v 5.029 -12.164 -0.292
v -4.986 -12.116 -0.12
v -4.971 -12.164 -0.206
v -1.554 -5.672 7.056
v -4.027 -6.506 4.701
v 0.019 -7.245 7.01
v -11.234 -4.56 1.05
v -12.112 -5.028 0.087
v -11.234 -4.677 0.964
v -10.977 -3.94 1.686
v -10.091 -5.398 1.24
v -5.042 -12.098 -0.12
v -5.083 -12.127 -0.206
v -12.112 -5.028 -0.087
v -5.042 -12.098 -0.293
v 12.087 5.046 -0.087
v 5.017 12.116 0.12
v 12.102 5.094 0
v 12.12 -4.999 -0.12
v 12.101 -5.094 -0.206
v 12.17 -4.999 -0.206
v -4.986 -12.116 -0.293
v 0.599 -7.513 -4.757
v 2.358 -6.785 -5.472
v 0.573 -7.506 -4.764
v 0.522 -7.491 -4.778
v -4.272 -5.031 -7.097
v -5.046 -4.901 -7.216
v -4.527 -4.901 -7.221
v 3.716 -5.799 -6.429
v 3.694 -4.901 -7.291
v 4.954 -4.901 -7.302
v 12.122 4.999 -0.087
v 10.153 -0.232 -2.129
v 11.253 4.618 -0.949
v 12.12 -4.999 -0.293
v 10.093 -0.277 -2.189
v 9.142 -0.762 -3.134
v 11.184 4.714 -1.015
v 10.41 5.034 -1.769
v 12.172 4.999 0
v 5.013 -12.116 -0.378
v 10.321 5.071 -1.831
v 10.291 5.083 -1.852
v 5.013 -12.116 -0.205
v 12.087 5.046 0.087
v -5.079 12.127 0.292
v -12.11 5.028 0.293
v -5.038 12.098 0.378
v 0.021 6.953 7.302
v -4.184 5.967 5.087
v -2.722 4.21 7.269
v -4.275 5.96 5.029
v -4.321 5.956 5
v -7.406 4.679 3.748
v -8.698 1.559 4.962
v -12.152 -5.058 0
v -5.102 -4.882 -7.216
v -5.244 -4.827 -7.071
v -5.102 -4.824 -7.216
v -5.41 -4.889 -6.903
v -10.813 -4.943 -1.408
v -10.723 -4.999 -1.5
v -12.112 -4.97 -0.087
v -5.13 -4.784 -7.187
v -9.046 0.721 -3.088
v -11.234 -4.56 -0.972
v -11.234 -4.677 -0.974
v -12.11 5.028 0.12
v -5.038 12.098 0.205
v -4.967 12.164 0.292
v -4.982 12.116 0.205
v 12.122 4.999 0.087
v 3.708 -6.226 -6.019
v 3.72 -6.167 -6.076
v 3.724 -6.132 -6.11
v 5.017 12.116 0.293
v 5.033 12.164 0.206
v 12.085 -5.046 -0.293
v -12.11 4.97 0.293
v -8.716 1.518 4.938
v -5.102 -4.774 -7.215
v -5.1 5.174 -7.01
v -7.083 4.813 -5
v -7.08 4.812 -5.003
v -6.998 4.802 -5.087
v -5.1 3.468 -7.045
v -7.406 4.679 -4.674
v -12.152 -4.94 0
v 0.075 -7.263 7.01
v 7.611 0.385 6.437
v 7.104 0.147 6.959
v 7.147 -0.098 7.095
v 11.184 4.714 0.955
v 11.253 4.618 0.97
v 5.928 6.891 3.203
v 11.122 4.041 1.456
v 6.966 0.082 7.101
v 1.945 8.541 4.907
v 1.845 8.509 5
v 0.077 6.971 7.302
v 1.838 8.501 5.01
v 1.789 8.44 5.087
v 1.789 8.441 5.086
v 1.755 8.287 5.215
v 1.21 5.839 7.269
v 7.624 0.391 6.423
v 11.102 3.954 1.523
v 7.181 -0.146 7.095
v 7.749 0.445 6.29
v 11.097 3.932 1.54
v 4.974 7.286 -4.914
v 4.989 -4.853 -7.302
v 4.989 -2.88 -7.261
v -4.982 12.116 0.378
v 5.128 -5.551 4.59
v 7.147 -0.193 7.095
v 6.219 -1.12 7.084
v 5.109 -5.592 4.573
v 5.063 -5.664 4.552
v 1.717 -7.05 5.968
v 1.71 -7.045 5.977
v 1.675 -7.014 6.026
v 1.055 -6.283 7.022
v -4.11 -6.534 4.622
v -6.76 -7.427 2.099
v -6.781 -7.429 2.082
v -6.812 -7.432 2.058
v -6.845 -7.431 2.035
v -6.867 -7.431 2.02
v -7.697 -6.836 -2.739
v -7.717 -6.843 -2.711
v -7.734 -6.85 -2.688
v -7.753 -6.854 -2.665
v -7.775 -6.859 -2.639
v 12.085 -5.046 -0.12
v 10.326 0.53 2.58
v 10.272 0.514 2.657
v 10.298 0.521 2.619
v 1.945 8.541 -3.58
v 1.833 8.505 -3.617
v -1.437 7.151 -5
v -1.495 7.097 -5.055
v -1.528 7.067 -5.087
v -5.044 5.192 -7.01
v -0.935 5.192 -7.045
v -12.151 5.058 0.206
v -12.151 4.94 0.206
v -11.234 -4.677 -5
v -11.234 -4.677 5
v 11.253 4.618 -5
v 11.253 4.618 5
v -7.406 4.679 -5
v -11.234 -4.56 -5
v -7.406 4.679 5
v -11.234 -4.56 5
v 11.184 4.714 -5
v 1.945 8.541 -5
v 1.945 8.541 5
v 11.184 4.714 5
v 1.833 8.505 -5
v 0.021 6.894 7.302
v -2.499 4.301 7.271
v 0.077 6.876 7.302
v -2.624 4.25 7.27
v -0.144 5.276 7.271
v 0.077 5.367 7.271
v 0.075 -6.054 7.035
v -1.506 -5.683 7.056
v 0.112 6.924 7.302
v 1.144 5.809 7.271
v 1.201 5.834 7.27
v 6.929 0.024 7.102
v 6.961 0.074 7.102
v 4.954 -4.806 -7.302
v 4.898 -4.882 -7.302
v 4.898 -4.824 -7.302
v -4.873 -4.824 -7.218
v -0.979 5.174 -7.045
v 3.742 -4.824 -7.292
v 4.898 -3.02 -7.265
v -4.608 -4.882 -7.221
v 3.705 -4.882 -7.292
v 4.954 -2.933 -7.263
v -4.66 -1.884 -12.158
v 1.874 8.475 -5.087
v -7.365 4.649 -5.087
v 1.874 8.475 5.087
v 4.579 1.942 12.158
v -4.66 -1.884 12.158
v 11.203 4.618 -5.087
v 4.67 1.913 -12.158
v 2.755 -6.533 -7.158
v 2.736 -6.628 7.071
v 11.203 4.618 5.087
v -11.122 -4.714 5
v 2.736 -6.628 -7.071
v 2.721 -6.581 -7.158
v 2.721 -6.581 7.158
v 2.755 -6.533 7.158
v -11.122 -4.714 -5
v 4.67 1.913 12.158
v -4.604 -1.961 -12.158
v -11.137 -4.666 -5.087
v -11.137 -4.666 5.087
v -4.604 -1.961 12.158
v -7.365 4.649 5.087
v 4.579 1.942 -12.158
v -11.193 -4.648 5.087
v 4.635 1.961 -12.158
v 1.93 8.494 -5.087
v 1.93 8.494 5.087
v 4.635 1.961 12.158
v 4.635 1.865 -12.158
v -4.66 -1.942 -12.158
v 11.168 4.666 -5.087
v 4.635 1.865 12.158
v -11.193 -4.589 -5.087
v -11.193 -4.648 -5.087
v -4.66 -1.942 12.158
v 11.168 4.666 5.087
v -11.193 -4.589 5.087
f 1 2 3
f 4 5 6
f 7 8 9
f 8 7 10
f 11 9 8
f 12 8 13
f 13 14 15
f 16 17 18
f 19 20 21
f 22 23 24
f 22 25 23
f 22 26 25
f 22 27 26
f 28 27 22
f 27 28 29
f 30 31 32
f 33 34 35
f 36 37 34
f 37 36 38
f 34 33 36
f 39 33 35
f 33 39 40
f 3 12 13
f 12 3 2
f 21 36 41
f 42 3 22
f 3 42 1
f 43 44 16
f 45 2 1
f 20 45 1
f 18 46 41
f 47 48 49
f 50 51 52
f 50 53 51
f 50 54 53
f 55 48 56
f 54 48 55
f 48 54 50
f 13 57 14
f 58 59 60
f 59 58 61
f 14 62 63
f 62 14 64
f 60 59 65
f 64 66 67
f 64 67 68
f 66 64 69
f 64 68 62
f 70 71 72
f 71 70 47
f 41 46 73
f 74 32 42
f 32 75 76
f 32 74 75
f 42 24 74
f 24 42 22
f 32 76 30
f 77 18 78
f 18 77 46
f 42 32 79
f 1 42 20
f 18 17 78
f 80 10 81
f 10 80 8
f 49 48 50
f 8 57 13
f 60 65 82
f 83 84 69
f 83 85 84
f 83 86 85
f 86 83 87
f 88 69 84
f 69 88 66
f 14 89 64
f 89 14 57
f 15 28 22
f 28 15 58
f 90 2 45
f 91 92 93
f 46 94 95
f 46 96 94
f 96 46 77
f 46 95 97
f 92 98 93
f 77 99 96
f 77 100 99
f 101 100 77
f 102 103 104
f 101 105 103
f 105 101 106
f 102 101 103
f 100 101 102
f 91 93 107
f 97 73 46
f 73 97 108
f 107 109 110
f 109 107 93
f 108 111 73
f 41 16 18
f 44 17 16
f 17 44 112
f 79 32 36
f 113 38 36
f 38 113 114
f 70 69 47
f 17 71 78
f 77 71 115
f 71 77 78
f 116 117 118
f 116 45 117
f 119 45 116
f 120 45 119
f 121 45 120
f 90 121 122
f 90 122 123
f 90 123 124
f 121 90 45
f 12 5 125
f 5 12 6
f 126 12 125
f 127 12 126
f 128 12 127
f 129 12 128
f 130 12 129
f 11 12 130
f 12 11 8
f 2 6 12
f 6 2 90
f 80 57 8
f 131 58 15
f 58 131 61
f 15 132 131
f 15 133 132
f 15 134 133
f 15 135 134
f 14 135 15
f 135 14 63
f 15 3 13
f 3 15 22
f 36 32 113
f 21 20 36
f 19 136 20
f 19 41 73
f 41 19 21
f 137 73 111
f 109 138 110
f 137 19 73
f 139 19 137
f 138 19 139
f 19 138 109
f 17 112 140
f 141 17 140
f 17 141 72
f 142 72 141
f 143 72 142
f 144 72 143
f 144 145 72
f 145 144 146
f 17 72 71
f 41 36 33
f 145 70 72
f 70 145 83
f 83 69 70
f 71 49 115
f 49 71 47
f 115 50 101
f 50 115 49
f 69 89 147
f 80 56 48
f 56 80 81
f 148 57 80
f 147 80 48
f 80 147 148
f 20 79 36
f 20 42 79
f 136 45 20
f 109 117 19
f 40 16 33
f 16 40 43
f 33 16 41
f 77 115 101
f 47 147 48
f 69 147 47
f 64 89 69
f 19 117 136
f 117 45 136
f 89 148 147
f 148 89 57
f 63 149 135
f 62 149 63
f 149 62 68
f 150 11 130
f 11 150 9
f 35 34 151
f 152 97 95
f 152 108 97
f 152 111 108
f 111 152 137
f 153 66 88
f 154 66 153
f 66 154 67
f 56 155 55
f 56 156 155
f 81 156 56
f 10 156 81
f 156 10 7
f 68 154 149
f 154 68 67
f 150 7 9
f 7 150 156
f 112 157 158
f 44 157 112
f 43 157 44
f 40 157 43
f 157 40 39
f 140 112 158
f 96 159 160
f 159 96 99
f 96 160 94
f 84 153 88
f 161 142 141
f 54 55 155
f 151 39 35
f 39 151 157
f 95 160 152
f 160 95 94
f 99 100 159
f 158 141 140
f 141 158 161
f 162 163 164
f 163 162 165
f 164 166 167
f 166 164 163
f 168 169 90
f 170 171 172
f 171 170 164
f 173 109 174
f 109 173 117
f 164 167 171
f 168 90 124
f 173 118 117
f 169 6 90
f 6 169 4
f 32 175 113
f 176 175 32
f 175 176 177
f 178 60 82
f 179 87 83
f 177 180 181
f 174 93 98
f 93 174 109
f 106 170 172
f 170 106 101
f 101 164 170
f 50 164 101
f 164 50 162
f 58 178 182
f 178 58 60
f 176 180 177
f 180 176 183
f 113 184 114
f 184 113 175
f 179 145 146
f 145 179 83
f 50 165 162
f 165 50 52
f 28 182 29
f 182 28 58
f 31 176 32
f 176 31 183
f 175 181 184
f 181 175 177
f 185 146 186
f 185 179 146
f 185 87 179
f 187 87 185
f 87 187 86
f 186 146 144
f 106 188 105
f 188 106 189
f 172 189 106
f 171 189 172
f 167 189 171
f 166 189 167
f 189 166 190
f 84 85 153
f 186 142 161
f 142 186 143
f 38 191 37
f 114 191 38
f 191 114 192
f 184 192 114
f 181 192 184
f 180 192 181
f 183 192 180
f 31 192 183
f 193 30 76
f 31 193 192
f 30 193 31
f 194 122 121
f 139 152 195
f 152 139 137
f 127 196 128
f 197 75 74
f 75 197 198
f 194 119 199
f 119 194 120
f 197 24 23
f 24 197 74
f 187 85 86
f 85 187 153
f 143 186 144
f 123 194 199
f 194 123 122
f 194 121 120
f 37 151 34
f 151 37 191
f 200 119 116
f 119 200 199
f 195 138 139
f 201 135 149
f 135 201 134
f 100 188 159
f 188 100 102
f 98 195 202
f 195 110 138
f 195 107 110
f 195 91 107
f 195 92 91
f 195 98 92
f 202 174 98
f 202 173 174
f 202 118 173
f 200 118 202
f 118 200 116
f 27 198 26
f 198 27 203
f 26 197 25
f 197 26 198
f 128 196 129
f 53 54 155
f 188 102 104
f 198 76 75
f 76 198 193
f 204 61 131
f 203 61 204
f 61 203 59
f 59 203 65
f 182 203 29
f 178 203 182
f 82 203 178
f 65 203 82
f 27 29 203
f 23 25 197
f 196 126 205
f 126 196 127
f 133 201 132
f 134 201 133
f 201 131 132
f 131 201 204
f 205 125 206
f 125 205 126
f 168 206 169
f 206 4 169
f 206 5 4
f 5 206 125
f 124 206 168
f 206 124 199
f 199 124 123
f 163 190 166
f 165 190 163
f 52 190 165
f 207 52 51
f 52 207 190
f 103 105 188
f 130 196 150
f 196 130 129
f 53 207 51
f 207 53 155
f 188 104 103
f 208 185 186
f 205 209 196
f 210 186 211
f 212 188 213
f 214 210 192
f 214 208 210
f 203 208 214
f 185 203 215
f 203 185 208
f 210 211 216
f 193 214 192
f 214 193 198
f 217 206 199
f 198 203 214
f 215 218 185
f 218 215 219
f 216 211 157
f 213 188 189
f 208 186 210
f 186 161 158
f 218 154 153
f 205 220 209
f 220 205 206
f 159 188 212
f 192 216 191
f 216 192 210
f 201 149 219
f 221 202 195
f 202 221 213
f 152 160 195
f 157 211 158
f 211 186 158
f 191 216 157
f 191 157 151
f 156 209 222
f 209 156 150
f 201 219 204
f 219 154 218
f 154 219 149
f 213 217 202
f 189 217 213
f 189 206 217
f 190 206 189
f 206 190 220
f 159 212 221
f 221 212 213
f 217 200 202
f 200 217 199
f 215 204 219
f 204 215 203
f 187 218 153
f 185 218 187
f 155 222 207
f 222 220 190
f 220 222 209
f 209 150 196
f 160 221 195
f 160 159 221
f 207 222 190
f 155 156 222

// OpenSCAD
// Auto-generated OpenSCAD file

    inner_points = 10*[[0.4619566327305774, 0.19130099183283442, -1.2071067811865475], [-0.46195663273057797, -0.19130099183283406, -1.2071067811865475], [0.46195663273057797, 0.19130099183283406, 1.2071067811865475], [-0.4619566327305774, -0.19130099183283442, 1.2071067811865475], [1.1152619679663673, 0.46184144897825313, -0.5000000000000002], [-1.1152619679663673, -0.461841448978253, -0.4999999999999998], [1.1152619679663673, 0.461841448978253, 0.4999999999999998], [-1.1152619679663673, -0.46184144897825313, 0.5000000000000002], [0.27054045714541874, -0.6533053352357897, -0.7071067811865477], [0.2705404571454191, -0.6533053352357899, 0.7071067811865475], [0.9238457923812087, -0.38276487809037096, -2.792716462039856e-16], [-0.38276487809037096, -0.9238457923812087, -4.7467621895578584e-17], [0.19141617558515864, 0.8446063270686242, -0.49999999999999994], [-0.7324970898759966, 0.46200434340295565, -0.4999999999999998], [0.19141617558515892, 0.844606327068624, 0.5000000000000001], [-0.7324970898759964, 0.4620043434029555, 0.5000000000000002]];

    outer_points = 10*[[-1.20715085540928, -0.49989358214569235, 8.597197695362629e-07], [-1.2069745470430784, 0.49989358214569235, 0.020630814483457764], [1.2069745470430784, -0.49989358214569235, -0.020630814483457764], [1.20715085540928, 0.49989358214569235, -8.597197695362629e-07], [-0.5001945645070083, -1.2068498657593993, -0.020629598656099847], [-0.49976891845816496, 1.2068498657593993, 0.029175517925539712], [0.49976891845816496, -1.2068498657593993, -0.029175517925539712], [0.5001945645070083, 1.2068498657593993, 0.020629598656099847], [-0.7010393684168068, -0.014588113623628919, 0.7129733451333711], [0.7131225510703787, -0.014588113623628919, 0.7008875901995837], [0.005916922485465028, -0.721544397237336, 0.6923428867575018], [0.006166260168106925, 0.6923681699900782, 0.721518048575453], [-0.5061114869924733, -0.4853054685220634, -0.7129724854136016], [-0.5059351786262719, 0.5144816957693212, -0.6923425306499132], [0.4938519959726999, -0.4853054685220634, -0.7215184046830415], [0.4940283043389013, 0.5144816957693212, -0.7008884499193532]];

    // Convex hull for inner set (I)
    module inner_hull() {
        hull() {
            for (p = inner_points) {
                translate(p) sphere(r=0.1);
            }
        }
    }

    // Convex hull for outer set (O) minus inner hull (O \ I)
    module outer_minus_inner() {
        difference() {
            hull() {
                for (p = outer_points) {
                    translate(p) sphere(r=0.1);
                }
            }
            inner_hull(); // Subtract inner hull
        }
    }

    // Convex hull for outer set (O) minus all translated inner hulls
    module outer_minus_AllTranslationInner() {
        difference() {
            hull() {
                for (p = outer_points) {
                    translate(p) sphere(r=0.1);
                }
            }
            hull() {
                translate([0,0,50]) inner_hull();
                translate([0,0,-50]) inner_hull();
            }; // Subtract translated inner hulls
        }
    }

    // Difference between outer_minus_inner and outer_minus_AllTranslationInner
    module outer_minus_inner_diff() {
        difference() {
            // Outer minus inner
            difference() {
                hull() {
                    for (p = outer_points) {
                        translate(p) sphere(r=0.1);
                    }
                }
                inner_hull();
            }

            // Subtract Outer minus AllTranslationInner
            difference() {
                hull() {
                    for (p = outer_points) {
                        translate(p) sphere(r=0.1);
                    }
                }
                hull() {
                    translate([0,0,50]) inner_hull();
                    translate([0,0,-50]) inner_hull();
                };
            }
        }
    }

    // Rendering all with colors applied
    color([1, 0, 0, 0.5]) inner_hull(); // Transparent red
    color([0, 1, 0, 1]) outer_minus_AllTranslationInner(); // Opaque green
    color([1, 1, 0, 1]) outer_minus_inner_diff(); // Opaque yellow
    
